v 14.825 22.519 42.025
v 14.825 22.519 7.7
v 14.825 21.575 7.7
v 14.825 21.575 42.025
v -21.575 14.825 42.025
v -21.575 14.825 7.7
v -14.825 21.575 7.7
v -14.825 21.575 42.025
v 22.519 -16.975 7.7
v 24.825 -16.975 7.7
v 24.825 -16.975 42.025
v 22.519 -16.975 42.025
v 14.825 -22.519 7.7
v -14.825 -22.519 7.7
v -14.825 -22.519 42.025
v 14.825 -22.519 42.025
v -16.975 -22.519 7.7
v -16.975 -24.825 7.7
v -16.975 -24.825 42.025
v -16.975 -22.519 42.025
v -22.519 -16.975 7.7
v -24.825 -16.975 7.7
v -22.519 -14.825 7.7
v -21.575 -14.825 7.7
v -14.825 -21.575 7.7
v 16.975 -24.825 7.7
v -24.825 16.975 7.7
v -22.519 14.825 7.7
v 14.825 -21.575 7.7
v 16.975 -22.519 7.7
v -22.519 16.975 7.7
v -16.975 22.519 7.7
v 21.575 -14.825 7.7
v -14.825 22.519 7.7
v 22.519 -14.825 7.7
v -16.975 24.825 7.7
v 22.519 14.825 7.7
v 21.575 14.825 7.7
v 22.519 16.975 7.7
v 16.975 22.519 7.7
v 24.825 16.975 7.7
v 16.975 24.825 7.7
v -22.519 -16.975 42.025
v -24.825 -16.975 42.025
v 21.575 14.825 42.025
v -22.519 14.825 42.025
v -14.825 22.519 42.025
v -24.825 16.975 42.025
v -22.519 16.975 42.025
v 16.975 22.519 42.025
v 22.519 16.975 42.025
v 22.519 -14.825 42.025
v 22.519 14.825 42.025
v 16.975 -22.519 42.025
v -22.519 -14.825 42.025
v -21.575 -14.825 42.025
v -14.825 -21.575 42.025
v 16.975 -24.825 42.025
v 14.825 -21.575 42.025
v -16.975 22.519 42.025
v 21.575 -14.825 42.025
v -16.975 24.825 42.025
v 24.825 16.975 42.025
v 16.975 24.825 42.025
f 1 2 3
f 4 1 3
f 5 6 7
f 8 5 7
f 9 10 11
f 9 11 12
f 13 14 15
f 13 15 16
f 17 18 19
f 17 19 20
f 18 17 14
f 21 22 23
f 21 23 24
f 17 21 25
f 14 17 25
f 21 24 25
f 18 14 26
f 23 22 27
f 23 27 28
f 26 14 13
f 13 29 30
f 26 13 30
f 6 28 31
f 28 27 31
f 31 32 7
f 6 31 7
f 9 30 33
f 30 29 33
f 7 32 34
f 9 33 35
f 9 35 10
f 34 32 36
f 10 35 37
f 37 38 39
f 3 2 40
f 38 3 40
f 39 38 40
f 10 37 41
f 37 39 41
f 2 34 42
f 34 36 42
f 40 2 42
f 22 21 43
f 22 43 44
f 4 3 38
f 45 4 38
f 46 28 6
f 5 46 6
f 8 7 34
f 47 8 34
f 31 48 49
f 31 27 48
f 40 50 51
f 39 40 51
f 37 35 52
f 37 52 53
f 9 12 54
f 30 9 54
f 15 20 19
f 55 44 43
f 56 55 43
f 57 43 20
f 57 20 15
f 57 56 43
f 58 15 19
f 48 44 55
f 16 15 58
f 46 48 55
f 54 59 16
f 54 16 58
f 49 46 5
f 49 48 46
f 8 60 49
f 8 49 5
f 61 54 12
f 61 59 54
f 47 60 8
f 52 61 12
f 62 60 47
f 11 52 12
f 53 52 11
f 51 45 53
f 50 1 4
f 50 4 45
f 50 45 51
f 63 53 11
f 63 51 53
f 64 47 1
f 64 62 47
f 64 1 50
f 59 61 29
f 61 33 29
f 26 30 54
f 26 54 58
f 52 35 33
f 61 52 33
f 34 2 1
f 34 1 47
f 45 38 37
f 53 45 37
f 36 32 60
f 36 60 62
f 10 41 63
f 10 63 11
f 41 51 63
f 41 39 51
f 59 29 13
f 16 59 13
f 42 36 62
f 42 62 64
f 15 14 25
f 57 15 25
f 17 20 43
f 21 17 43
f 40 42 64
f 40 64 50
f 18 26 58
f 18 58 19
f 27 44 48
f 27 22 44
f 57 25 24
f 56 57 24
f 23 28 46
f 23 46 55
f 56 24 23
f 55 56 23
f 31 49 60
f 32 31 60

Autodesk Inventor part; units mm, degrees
ref_plane "YZ Plane" through (0, 0, 0) normal (1, 0, 0) x (0, 1, 0)
ref_plane "XZ Plane" through (0, 0, 0) normal (0, 1, 0) x (-1, 0, 0)
sketch "Sketch1" plane through (0, 0, 0) normal (0, 0, 1) x (1, 0, 0)
  circle A0 centre (-10, 20.9) radius 1.875 projected
  circle A1 centre (-10, -20.9) radius 1.875 projected
  circle A2 centre (10, 20.9) radius 1.875 projected
  circle A3 centre (10, -20.9) radius 1.875 projected
  circle A4 centre (20.8, -14.4) radius 2.075 projected
  circle A5 centre (20.8, 14.4) radius 2.075 projected
  circle A6 centre (-20.8, 14.4) radius 2.075 projected
  circle A7 centre (-20.8, -14.4) radius 2.075 projected
  line L0 (16.9, -16.9) -> (-16.9, -16.9) projected
  line L1 (-16.9, -16.9) -> (-16.9, 16.9) projected
  line L2 (-16.9, 16.9) -> (16.9, 16.9) projected
  line L3 (16.9, 16.9) -> (16.9, -16.9) projected
  line L4 (-17.05, 24.9) -> (-17.05, 22.55) projected
  line L5 (-17.05, 22.55) -> (-22.55, 17.05) projected
  line L6 (-22.55, 17.05) -> (-24.9, 17.05) projected
  line L7 (-24.9, 17.05) -> (-24.9, -17.05) projected
  line L8 (-24.9, -17.05) -> (-22.55, -17.05) projected
  line L9 (-22.55, -17.05) -> (-17.05, -22.55) projected
  line L10 (-17.05, -22.55) -> (-17.05, -24.9) projected
  line L11 (-17.05, -24.9) -> (17.05, -24.9) projected
  line L12 (17.05, -24.9) -> (17.05, -22.55) projected
  line L13 (17.05, -22.55) -> (22.55, -17.05) projected
  line L14 (22.55, -17.05) -> (24.9, -17.05) projected
  line L15 (24.9, -17.05) -> (24.9, 17.05) projected
  line L16 (24.9, 17.05) -> (22.55, 17.05) projected
  line L17 (22.55, 17.05) -> (17.05, 22.55) projected
  line L18 (17.05, 22.55) -> (17.05, 24.9) projected
  line L19 (17.05, 24.9) -> (-17.05, 24.9) projected
  line L20 (24.825, 16.975) -> (24.825, -16.975)
  line L21 (24.825, -16.975) -> (22.5189, -16.975)
  line L22 (22.5189, -16.975) -> (16.975, -22.5189)
  line L23 (16.975, -22.5189) -> (16.975, -24.825)
  line L24 (16.975, -24.825) -> (-16.975, -24.825)
  line L25 (-16.975, -24.825) -> (-16.975, -22.5189)
  line L26 (-16.975, -22.5189) -> (-22.5189, -16.975)
  line L27 (-22.5189, -16.975) -> (-24.825, -16.975)
  line L28 (-24.825, -16.975) -> (-24.825, 16.975)
  line L29 (-24.825, 16.975) -> (-22.5189, 16.975)
  line L30 (-22.5189, 16.975) -> (-16.975, 22.5189)
  line L31 (-16.975, 22.5189) -> (-16.975, 24.825)
  line L32 (-16.975, 24.825) -> (16.975, 24.825)
  line L33 (16.975, 24.825) -> (16.975, 22.5189)
  line L34 (16.975, 22.5189) -> (22.5189, 16.975)
  line L35 (22.5189, 16.975) -> (24.825, 16.975)
  line L36 (22.5189, -16.975) -> (22.5189, 16.975)
  line L37 (16.975, 22.5189) -> (-16.975, 22.5189)
  line L38 (-22.5189, 16.975) -> (-22.5189, -16.975)
  line L39 (-16.975, -22.5189) -> (16.975, -22.5189)
  line L40 (16.975, 24.825) -> (24.825, 24.825)
  line L41 (24.825, 24.825) -> (24.825, 16.975)
  line L42 (24.825, 24.825) -> (14.825, 24.825)
  line L43 (14.825, 24.825) -> (14.825, 21.575)
  line L44 (21.575, 14.825) -> (24.825, 14.825)
  line L45 (24.825, 14.825) -> (24.825, 24.825)
  line L46 (14.825, 21.575) -> (21.575, 14.825)
  line L47 (-21.575, 14.825) -> (-14.825, 21.575)
  line L48 (-14.825, 21.575) -> (-14.825, 24.825)
  line L49 (-24.825, 14.825) -> (-21.575, 14.825)
  line L50 (-14.825, -21.575) -> (-21.575, -14.825)
  line L51 (-21.575, -14.825) -> (-24.825, -14.825)
  line L52 (-14.825, -24.825) -> (-14.825, -21.575)
  line L53 (21.575, -14.825) -> (14.825, -21.575)
  line L54 (14.825, -21.575) -> (14.825, -24.825)
  line L55 (24.825, -14.825) -> (21.575, -14.825)
  point P0 (0, 0)
  point P1 (14.825, 14.825)
  point P2 (22.5189, 14.825)
  point P3 (22.5189, -14.825)
  point P4 (14.825, -22.5189)
  point P5 (-14.825, -22.5189)
  point P6 (-22.5189, -14.825)
  point P7 (-22.5189, 14.825)
  point P8 (-14.825, 22.5189)
  point P9 (14.825, 22.5189)
  dimension "d0" = 0.075
  dimension "d3" = 360
  dimension "d5" = 10
  dimension "d6" = 10
  dimension "d7" = 6.75
  dimension "d8" = 6.75
  dimension "d11" = 360
ref_plane "Work Plane1" through (-24.9, -24.9, 7.7) normal (0, 0, 1) x (1, 0, 0)
extrude "Extrusion1" add sketch "Sketch1" along normal blind 34.325 from surface at 7.7 contours L37 A0 | A0 L37 L48 L32 L43 A2 | A2 L37 | L48 L47 A6 L38 L30 L37 | L37 L31 L32 L48 | L43 L32 L33 L37 | L37 L34 L36 A5 L46 L43 | L38 A6 L49 L28 L29 | L47 L49 L38 A6 | L38 L49 A6 | L35 L20 L44 A5 L36 | A5 L36 L44 L46 | L49 A6 L38 A7 L51 L28 | L49 L38 A6 | A5 L44 L36 | L36 L44 A5 | A5 L44 L20 L55 A4 L36 | L51 A7 L38 L27 L28 | L38 L51 A7 | A4 L55 L36 | L51 L38 A7 | L51 L50 A7 L38 | L20 L21 L36 A4 L55 | L53 L55 L36 A4 | A4 L36 L22 L39 L54 L53 | L55 A4 L36 | L38 A7 L50 L52 L39 L26 | L39 L52 L24 L25 | L54 L24 L52 L39 A1 A3 | L39 L23 L24 L54 | A3 L39 | L39 A1 picked at (-9.805, 22.5731) picked at (9.805, 22.5731) picked at (-20.715, 15.8728) picked at (20.715, 15.8728) picked at (-20.715, -15.8728) picked at (20.715, -15.8728) picked at (10.195, -22.5731) picked at (-9.805, -22.5731)
properties part number "Tunnel Vertical"
